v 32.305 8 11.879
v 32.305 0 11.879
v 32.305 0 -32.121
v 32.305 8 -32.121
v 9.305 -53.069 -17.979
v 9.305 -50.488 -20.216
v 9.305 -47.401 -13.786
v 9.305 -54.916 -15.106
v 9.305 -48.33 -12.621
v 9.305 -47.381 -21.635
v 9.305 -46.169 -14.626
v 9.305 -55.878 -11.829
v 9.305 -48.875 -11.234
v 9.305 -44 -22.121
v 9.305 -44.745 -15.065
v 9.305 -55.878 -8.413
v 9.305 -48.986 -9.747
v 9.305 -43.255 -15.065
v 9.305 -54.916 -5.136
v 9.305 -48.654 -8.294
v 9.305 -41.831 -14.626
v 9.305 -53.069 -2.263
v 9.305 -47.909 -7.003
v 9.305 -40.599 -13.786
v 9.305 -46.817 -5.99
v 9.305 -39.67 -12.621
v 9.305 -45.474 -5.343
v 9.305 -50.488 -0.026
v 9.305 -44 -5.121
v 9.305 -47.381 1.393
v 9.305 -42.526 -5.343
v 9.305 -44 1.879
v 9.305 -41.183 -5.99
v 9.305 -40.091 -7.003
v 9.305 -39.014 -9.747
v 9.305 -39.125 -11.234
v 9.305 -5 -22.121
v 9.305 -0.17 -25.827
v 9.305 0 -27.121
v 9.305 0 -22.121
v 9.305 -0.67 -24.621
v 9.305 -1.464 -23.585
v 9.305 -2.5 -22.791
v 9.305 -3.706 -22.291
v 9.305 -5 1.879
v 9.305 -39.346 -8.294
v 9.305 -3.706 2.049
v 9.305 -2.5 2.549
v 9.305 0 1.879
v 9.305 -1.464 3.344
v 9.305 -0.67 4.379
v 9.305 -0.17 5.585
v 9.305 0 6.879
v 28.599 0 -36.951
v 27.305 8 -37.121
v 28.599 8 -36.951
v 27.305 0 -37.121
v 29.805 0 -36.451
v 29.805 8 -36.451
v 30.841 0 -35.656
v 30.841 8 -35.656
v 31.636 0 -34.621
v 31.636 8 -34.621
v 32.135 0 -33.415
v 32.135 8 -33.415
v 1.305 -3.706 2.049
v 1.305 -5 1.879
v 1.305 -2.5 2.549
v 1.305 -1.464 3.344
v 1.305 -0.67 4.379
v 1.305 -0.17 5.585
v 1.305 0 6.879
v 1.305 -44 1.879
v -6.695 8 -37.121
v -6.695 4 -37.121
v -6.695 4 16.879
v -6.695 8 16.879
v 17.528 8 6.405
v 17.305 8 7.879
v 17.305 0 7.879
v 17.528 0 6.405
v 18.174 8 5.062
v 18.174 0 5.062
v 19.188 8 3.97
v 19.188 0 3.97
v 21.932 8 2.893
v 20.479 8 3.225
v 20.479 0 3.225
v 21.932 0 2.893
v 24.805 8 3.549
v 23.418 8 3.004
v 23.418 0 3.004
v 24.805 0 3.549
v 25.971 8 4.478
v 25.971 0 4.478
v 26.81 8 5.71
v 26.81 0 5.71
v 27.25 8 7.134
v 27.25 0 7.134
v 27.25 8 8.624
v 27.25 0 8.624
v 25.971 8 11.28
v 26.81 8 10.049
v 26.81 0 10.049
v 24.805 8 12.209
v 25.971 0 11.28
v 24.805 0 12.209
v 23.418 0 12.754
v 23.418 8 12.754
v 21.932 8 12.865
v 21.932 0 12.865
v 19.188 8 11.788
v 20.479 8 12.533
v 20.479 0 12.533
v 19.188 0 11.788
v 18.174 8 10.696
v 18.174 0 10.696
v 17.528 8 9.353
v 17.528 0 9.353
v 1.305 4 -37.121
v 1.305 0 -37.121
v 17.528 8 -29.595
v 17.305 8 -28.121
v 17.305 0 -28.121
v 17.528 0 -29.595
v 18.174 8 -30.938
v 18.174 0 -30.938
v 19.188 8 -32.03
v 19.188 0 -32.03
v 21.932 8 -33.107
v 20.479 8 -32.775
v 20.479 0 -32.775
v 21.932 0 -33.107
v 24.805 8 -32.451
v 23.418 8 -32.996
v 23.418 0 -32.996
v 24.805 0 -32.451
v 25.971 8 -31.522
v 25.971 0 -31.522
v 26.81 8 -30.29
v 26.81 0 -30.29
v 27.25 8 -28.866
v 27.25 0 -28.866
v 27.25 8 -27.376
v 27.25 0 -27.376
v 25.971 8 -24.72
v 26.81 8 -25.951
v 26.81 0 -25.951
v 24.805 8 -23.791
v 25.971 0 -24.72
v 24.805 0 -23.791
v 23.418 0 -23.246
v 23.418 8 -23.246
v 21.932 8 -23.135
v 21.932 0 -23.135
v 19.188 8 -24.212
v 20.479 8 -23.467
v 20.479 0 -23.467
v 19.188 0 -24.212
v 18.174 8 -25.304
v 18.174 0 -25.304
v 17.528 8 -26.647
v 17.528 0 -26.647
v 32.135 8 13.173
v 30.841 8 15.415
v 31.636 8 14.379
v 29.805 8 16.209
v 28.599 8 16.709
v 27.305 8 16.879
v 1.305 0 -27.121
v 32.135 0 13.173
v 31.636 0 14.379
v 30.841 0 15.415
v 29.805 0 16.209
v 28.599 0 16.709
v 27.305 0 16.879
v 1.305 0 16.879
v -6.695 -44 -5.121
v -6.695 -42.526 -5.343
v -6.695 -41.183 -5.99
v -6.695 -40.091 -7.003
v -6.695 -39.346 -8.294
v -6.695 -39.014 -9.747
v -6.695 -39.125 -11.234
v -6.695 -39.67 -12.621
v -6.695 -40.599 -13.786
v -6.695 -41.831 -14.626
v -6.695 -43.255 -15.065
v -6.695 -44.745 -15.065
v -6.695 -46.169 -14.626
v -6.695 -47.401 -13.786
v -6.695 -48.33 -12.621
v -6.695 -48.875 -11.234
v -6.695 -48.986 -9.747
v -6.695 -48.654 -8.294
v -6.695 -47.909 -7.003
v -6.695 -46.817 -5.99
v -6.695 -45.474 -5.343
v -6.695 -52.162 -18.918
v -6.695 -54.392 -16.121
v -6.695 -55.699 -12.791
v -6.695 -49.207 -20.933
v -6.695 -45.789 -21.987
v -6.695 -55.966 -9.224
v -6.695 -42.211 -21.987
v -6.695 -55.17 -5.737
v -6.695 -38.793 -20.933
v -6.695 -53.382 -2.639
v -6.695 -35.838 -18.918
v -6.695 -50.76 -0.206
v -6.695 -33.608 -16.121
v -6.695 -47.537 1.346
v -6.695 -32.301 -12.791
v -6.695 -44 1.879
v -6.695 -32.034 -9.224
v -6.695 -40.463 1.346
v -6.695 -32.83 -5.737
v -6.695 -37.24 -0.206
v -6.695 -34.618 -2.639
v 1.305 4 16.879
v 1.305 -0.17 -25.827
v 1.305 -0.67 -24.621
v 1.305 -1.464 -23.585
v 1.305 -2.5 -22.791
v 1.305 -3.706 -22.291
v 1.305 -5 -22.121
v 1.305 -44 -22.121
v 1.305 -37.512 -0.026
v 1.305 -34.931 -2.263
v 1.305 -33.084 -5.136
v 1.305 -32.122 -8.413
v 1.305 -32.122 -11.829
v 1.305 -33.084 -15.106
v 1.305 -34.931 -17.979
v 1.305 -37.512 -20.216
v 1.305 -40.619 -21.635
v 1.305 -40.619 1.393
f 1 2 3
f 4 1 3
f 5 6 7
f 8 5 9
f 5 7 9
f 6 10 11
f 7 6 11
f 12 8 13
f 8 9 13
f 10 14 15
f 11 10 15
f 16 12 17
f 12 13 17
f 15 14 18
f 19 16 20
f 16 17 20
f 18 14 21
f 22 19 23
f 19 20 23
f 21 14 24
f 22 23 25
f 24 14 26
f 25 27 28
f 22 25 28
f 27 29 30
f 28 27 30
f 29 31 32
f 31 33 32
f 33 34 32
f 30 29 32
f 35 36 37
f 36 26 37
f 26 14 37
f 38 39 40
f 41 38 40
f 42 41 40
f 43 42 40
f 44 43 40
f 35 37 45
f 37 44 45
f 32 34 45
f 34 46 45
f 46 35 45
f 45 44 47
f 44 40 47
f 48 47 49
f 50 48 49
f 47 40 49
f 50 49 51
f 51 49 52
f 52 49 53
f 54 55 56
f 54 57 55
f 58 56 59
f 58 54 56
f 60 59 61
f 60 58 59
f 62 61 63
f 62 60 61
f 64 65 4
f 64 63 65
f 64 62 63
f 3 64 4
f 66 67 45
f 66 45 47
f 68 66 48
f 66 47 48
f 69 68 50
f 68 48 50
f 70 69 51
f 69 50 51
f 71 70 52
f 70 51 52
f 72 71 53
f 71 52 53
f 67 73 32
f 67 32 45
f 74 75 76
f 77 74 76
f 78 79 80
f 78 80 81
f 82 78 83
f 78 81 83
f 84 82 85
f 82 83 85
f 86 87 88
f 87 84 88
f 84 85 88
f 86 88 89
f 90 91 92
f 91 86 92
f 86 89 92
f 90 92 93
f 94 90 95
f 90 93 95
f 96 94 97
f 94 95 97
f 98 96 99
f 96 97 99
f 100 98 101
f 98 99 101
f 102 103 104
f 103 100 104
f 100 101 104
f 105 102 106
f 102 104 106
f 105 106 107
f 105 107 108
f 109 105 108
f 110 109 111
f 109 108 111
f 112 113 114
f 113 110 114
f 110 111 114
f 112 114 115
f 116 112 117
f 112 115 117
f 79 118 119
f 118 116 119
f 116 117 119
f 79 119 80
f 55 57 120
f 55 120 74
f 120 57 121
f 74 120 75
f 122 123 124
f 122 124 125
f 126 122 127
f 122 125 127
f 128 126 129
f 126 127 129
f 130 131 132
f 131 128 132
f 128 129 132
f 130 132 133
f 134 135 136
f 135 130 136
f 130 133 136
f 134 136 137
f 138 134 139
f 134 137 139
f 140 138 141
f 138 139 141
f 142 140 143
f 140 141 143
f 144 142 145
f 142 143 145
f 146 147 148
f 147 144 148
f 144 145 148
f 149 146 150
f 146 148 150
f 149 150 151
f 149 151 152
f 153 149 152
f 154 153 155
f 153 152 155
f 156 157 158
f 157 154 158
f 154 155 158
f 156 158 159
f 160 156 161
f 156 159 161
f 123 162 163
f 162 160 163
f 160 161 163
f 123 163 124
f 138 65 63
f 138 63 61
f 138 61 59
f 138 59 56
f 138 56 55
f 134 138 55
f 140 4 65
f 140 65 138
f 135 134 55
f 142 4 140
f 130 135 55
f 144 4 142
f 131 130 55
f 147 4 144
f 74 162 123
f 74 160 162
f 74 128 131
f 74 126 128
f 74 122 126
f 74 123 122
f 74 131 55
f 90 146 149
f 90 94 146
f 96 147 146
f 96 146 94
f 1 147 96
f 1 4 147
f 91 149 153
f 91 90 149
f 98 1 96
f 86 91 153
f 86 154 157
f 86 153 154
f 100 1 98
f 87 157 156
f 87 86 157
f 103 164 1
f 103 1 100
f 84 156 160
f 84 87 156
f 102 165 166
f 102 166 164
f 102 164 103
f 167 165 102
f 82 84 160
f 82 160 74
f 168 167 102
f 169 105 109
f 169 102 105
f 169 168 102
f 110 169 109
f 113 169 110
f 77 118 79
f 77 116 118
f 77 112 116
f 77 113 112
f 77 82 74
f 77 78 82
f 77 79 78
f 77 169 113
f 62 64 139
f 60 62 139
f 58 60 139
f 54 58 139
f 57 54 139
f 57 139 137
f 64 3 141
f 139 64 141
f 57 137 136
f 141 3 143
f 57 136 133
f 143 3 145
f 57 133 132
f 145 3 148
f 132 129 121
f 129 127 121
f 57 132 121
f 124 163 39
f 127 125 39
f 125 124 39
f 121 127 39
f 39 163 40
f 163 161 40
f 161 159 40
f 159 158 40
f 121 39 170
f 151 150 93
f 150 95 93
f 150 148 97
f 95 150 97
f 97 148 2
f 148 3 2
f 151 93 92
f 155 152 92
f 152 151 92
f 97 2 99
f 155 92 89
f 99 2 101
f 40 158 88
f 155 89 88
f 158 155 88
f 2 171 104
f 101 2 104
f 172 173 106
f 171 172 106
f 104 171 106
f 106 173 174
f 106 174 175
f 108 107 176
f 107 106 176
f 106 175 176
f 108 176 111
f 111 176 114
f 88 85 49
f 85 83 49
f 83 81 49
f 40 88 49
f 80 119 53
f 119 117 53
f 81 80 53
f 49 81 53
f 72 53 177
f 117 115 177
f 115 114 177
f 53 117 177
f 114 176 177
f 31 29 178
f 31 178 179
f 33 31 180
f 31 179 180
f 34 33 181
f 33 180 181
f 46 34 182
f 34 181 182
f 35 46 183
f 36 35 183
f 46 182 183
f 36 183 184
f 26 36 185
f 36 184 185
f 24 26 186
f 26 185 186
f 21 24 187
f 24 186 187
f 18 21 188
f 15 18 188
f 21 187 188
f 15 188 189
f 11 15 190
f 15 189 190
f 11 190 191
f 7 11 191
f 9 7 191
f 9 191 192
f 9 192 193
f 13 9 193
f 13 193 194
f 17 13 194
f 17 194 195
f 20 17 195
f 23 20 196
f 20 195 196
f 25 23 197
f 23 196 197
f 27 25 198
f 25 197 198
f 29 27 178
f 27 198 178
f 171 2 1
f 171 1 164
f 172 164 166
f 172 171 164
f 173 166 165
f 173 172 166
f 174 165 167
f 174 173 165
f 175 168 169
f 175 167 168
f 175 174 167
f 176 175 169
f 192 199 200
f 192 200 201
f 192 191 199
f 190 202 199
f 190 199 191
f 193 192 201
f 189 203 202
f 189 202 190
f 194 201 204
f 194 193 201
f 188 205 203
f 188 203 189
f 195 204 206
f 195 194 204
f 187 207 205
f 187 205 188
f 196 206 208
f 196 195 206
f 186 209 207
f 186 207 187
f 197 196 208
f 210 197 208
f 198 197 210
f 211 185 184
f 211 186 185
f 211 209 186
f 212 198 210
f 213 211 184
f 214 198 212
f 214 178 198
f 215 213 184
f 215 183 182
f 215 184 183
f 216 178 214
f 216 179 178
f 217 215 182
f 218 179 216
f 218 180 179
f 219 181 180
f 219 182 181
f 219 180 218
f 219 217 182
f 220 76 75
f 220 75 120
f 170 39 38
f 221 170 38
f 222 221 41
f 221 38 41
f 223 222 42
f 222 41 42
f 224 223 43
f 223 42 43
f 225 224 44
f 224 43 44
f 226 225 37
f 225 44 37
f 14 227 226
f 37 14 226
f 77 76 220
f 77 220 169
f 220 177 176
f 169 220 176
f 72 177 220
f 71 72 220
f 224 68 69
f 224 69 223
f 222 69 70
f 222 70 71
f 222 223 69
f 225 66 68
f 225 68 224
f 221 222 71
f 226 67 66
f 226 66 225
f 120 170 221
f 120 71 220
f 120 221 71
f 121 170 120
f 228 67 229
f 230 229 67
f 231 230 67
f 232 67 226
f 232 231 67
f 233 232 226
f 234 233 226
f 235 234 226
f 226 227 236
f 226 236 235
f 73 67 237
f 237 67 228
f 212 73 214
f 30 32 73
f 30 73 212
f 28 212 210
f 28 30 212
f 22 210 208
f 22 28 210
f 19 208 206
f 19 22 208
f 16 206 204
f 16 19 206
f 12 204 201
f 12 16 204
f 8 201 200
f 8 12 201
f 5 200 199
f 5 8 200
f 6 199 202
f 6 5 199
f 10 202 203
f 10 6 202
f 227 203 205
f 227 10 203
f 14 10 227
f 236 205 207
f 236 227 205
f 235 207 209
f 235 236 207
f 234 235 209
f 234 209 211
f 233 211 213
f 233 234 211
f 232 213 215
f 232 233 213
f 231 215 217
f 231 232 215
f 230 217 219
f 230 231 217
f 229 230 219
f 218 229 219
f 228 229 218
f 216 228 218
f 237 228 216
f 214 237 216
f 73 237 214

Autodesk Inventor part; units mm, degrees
ref_plane "YZ Plane" through (0, 0, 0) normal (1, 0, 0) x (0, 1, 0)
ref_plane "XZ Plane" through (0, 0, 0) normal (0, 1, 0) x (-1, 0, 0)
ref_plane "XY Plane" through (0, 0, 0) normal (0, 0, 1) x (1, 0, 0)
sketch "Sketch1" plane through (0, 0, 0) normal (0, 1, 0) x (-1, 0, 0)
  line L0 (6.6946, 16.8791) -> (-27.3054, 16.8791)
  line L1 (-32.3054, 11.8791) -> (-32.3054, -32.1209)
  line L2 (-27.3054, -37.1209) -> (6.6946, -37.1209)
  line L3 (6.6946, -37.1209) -> (6.6946, 16.8791)
  arc A0 (-27.3054, 16.8791) -> (-32.3054, 11.8791) centre (-27.3054, 11.8791) ccw
  arc A1 (-32.3054, -32.1209) -> (-27.3054, -37.1209) centre (-27.3054, -32.1209) ccw
  circle A2 centre (-22.3054, 7.8791) radius 5
  circle A3 centre (-22.3054, -28.1209) radius 5
  point P0 (0, 0)
  point P1 (-32.3054, -37.1209)
  point P2 (-32.3054, 16.8791)
  dimension "d0" = 39
  dimension "d1" = 54
  dimension "d2" = 5
  dimension "d3" = 5
  dimension "d5" = 10
  dimension "d6" = 10
  dimension "d7" = 9
  dimension "d8" = 9
extrude "Extrusion1" add sketch "Sketch1" along normal blind 8
sketch "Sketch2" plane through (0, 0, 0) normal (0, -1, 0) x (1, 0, 0)
  line L0 (-6.6946, -37.1209) -> (-6.6946, 16.8791) projected
  line L1 (-6.6946, 16.8791) -> (1.3054, 16.8791)
  line L2 (-6.6946, 16.8791) -> (27.3054, 16.8791) projected
  line L3 (1.3054, 16.8791) -> (1.3054, -37.1209)
  line L4 (27.3054, -37.1209) -> (-6.6946, -37.1209) projected
  line L5 (-6.6946, -37.1209) -> (1.3054, -37.1209)
  line L6 (-6.6946, -37.1209) -> (-6.6946, 16.8791)
  point P0 (0, 0)
  dimension "d11" = 8
extrude "Extrusion2" cut sketch "Sketch2" against normal blind 4
ref_plane "Work Plane1" through (1.3054, 0, -37.1209) normal (-1, 0, 0) x (0, 0, 1)
sketch "Sketch3" plane through (1.3054, 0, -37.1209) normal (-1, 0, 0) x (0, 0, 1)
  line L0 (54, 0) -> (54, 8) projected
  circle A0 centre (27, -44) radius 5
  arc A1 (15, -44) -> (39, -44) centre (27, -44) ccw
  line L1 (39, -44) -> (39, 0)
  line L2 (49, 0) -> (5, 0) projected
  line L3 (15, -44) -> (15, 0)
  line L4 (39, 0) -> (15, 0)
  point P0 (37.1209, 0)
  dimension "d17" = 10
  dimension "d18" = 24
extrude "Extrusion3" add sketch "Sketch3" against normal blind 8
sketch "Sketch4" plane through (1.3054, 0, 16.8791) normal (-1, 0, 0) x (0, 0, 1)
  line L0 (0, 4) -> (0, 0) projected
  circle A0 centre (-27, -44) radius 12
  point P0 (-16.8791, 0)
  dimension "d23" = 24
extrude "Extrusion4" add sketch "Sketch4" along normal blind 8
sketch "Sketch5" plane through (-6.6946, -44, -10.1209) normal (-1, 0, 0) x (0, 0, 1)
  circle A0 centre (0, 0) radius 5
  point P0 (10.1209, 44)
  dimension "d26" = 10
extrude "Extrusion5" cut sketch "Sketch5" against normal blind 8
fillet "Face Fillet1" radius 5 1 edges at (5.3054, 0, 1.8791)
fillet "Face Fillet2" radius 5 1 edges at (5.3054, 0, -22.1209)
properties part number "yatak"
